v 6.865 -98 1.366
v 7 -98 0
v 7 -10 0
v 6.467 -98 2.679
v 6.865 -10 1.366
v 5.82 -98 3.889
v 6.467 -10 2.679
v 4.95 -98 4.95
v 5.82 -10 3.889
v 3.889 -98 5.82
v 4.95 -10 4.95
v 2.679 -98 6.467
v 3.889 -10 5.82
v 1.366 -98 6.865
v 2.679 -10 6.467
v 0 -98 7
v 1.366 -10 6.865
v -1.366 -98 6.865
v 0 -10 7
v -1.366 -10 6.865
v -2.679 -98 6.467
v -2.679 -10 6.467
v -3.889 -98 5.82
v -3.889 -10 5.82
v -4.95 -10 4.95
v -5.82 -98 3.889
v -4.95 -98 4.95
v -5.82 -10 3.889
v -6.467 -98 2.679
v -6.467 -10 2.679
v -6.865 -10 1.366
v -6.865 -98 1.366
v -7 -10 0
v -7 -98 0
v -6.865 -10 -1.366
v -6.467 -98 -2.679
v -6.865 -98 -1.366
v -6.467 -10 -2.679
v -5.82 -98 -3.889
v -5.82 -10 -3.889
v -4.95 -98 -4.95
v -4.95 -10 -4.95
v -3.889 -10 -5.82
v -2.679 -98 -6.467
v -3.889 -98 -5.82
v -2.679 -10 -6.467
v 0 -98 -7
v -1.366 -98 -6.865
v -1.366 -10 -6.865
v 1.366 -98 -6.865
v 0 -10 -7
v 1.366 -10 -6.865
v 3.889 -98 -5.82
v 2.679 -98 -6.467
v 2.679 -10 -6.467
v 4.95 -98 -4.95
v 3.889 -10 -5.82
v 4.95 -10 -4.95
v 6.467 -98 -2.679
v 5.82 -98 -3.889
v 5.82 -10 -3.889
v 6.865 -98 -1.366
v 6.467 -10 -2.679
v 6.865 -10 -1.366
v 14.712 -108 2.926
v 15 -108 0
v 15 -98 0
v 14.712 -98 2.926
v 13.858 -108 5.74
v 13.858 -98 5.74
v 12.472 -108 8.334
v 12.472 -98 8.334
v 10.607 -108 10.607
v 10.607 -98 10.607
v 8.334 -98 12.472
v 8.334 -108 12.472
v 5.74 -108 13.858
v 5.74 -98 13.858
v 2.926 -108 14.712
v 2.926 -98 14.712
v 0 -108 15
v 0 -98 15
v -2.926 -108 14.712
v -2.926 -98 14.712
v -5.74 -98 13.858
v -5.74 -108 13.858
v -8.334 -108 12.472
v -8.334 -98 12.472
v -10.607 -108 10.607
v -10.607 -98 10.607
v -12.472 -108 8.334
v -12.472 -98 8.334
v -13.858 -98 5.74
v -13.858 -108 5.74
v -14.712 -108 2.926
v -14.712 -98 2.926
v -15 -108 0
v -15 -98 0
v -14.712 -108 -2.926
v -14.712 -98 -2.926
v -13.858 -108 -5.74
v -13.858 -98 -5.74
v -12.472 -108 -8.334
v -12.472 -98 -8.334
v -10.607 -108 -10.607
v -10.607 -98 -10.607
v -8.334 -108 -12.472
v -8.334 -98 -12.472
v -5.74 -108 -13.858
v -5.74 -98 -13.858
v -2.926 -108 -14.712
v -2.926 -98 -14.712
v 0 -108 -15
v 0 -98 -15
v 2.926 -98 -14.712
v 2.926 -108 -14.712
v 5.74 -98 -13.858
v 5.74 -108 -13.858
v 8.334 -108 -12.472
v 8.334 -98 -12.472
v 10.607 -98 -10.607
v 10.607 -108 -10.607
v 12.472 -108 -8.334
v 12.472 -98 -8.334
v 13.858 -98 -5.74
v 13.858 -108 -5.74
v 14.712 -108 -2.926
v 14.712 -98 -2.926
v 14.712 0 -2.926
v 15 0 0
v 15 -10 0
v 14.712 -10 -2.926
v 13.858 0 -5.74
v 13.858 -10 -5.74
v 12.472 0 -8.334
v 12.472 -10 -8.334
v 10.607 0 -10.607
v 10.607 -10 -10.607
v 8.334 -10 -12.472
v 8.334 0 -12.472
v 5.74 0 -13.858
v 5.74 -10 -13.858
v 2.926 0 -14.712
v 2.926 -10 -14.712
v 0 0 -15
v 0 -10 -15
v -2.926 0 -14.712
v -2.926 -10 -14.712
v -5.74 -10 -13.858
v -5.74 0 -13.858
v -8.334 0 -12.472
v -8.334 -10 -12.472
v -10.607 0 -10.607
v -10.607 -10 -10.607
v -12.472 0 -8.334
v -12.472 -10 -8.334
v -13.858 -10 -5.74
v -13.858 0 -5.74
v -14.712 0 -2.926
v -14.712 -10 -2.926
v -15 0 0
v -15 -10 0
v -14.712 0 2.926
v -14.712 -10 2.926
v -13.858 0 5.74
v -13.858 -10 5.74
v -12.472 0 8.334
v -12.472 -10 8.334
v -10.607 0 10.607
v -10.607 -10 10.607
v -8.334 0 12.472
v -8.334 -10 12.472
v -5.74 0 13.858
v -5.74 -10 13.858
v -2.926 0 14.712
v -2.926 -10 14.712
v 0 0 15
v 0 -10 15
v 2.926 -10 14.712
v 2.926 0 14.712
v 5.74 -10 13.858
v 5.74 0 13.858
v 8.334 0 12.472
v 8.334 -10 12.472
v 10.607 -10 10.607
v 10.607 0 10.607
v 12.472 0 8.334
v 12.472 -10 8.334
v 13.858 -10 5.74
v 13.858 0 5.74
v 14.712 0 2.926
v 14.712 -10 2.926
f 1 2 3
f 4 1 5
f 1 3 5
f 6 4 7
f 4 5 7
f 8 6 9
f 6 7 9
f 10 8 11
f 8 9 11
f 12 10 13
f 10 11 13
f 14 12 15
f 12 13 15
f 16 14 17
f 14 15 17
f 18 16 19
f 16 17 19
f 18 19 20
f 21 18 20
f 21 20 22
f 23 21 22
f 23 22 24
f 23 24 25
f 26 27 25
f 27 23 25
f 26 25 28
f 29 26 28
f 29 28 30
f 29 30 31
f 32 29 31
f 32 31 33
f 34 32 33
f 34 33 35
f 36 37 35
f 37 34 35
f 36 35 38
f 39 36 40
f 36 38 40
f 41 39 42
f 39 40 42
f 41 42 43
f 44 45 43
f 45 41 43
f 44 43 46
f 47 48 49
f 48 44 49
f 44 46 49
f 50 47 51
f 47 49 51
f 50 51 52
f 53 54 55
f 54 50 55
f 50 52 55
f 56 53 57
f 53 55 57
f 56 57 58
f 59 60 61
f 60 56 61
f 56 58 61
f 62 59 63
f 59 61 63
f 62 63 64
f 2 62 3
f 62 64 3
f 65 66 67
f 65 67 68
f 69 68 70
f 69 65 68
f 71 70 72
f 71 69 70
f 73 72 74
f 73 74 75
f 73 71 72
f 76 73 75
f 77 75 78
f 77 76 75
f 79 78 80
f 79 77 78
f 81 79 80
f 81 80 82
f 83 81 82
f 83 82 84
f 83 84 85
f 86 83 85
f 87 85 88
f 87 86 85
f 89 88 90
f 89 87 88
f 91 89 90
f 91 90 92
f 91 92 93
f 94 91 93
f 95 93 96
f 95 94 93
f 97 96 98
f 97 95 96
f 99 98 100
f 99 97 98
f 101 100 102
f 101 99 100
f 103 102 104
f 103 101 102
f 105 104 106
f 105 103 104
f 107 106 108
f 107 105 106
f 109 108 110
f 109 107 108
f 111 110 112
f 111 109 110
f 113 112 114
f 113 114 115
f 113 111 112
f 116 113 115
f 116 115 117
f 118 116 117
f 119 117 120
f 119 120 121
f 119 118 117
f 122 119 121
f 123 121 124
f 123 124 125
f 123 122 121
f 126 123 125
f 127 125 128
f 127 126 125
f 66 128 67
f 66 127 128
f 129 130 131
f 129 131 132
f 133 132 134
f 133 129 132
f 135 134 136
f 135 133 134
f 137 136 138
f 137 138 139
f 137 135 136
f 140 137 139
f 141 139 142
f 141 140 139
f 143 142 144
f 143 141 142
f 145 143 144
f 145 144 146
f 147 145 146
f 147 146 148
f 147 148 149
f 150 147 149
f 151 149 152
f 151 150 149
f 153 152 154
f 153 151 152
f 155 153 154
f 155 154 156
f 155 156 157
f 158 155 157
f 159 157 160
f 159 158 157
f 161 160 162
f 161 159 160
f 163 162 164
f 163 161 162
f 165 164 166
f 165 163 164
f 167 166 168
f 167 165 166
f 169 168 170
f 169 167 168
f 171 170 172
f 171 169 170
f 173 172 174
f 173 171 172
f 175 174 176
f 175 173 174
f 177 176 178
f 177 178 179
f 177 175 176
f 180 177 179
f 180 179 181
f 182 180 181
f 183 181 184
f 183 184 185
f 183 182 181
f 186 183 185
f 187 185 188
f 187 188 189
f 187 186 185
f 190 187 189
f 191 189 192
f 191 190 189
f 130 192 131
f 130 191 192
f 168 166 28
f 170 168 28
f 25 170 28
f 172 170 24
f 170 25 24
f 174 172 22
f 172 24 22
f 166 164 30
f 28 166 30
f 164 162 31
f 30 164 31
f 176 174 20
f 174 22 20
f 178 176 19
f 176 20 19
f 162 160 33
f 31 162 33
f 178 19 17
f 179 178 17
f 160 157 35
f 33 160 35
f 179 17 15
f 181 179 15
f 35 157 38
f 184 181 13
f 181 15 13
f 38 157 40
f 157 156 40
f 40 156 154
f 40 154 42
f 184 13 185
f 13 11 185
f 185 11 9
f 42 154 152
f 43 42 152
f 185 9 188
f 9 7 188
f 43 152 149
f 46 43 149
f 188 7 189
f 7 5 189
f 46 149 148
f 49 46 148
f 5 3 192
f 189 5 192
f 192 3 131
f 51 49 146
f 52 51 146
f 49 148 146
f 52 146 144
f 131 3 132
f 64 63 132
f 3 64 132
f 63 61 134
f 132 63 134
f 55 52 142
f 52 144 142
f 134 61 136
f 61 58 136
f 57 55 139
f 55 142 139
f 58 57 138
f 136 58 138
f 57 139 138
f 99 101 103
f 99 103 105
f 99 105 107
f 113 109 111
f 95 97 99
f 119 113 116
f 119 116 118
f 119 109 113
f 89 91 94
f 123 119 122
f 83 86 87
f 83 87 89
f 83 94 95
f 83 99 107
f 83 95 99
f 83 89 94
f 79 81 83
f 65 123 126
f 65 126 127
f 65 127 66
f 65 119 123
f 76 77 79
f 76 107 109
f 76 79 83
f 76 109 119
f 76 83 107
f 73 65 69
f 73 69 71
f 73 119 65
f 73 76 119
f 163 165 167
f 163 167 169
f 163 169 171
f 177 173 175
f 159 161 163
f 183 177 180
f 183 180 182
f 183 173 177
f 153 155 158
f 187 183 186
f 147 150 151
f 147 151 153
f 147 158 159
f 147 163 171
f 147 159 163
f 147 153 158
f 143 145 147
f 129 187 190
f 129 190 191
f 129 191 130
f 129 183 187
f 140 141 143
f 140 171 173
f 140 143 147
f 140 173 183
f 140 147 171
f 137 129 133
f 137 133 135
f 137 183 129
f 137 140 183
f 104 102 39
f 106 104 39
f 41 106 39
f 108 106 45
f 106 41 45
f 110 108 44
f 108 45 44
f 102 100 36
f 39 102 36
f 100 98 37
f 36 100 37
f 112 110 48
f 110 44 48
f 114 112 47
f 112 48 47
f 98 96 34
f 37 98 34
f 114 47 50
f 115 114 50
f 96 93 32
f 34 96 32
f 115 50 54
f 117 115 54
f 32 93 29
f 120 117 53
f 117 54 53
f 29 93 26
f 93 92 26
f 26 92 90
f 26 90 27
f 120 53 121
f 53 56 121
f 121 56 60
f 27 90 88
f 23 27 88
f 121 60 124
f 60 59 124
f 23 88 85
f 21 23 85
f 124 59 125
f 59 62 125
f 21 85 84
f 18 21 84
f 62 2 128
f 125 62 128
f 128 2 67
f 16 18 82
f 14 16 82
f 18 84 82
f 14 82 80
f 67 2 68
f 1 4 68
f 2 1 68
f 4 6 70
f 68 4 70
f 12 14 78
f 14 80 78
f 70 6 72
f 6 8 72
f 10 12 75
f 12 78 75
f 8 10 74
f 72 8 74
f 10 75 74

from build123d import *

# Parameters (mm, degrees)
SKETCH1_R           = 15
BOSS_EXTRUDE1_DEPTH = 10
SKETCH2_R           = 7
BOSS_EXTRUDE2_DEPTH = 98
SKETCH4_R           = 15
BOSS_EXTRUDE3_DEPTH = 10


with BuildPart() as part:
    # Sketch1 → Boss-Extrude1 (new body)
    with BuildSketch(Plane(origin=(0, 0, 0), x_dir=(1, 0, 0), z_dir=(0, 1, 0))):
        Circle(SKETCH1_R)
    extrude(amount=-BOSS_EXTRUDE1_DEPTH)

    # Sketch2 → Boss-Extrude2 (add)
    with BuildSketch(Plane.XZ.offset(10)):
        Circle(SKETCH2_R)
    extrude(amount=BOSS_EXTRUDE2_DEPTH)

    # Sketch4 → Boss-Extrude3 (add)
    with BuildSketch(Plane.XZ.offset(108)):
        Circle(SKETCH4_R)
    extrude(amount=-BOSS_EXTRUDE3_DEPTH)


solid = part.part
